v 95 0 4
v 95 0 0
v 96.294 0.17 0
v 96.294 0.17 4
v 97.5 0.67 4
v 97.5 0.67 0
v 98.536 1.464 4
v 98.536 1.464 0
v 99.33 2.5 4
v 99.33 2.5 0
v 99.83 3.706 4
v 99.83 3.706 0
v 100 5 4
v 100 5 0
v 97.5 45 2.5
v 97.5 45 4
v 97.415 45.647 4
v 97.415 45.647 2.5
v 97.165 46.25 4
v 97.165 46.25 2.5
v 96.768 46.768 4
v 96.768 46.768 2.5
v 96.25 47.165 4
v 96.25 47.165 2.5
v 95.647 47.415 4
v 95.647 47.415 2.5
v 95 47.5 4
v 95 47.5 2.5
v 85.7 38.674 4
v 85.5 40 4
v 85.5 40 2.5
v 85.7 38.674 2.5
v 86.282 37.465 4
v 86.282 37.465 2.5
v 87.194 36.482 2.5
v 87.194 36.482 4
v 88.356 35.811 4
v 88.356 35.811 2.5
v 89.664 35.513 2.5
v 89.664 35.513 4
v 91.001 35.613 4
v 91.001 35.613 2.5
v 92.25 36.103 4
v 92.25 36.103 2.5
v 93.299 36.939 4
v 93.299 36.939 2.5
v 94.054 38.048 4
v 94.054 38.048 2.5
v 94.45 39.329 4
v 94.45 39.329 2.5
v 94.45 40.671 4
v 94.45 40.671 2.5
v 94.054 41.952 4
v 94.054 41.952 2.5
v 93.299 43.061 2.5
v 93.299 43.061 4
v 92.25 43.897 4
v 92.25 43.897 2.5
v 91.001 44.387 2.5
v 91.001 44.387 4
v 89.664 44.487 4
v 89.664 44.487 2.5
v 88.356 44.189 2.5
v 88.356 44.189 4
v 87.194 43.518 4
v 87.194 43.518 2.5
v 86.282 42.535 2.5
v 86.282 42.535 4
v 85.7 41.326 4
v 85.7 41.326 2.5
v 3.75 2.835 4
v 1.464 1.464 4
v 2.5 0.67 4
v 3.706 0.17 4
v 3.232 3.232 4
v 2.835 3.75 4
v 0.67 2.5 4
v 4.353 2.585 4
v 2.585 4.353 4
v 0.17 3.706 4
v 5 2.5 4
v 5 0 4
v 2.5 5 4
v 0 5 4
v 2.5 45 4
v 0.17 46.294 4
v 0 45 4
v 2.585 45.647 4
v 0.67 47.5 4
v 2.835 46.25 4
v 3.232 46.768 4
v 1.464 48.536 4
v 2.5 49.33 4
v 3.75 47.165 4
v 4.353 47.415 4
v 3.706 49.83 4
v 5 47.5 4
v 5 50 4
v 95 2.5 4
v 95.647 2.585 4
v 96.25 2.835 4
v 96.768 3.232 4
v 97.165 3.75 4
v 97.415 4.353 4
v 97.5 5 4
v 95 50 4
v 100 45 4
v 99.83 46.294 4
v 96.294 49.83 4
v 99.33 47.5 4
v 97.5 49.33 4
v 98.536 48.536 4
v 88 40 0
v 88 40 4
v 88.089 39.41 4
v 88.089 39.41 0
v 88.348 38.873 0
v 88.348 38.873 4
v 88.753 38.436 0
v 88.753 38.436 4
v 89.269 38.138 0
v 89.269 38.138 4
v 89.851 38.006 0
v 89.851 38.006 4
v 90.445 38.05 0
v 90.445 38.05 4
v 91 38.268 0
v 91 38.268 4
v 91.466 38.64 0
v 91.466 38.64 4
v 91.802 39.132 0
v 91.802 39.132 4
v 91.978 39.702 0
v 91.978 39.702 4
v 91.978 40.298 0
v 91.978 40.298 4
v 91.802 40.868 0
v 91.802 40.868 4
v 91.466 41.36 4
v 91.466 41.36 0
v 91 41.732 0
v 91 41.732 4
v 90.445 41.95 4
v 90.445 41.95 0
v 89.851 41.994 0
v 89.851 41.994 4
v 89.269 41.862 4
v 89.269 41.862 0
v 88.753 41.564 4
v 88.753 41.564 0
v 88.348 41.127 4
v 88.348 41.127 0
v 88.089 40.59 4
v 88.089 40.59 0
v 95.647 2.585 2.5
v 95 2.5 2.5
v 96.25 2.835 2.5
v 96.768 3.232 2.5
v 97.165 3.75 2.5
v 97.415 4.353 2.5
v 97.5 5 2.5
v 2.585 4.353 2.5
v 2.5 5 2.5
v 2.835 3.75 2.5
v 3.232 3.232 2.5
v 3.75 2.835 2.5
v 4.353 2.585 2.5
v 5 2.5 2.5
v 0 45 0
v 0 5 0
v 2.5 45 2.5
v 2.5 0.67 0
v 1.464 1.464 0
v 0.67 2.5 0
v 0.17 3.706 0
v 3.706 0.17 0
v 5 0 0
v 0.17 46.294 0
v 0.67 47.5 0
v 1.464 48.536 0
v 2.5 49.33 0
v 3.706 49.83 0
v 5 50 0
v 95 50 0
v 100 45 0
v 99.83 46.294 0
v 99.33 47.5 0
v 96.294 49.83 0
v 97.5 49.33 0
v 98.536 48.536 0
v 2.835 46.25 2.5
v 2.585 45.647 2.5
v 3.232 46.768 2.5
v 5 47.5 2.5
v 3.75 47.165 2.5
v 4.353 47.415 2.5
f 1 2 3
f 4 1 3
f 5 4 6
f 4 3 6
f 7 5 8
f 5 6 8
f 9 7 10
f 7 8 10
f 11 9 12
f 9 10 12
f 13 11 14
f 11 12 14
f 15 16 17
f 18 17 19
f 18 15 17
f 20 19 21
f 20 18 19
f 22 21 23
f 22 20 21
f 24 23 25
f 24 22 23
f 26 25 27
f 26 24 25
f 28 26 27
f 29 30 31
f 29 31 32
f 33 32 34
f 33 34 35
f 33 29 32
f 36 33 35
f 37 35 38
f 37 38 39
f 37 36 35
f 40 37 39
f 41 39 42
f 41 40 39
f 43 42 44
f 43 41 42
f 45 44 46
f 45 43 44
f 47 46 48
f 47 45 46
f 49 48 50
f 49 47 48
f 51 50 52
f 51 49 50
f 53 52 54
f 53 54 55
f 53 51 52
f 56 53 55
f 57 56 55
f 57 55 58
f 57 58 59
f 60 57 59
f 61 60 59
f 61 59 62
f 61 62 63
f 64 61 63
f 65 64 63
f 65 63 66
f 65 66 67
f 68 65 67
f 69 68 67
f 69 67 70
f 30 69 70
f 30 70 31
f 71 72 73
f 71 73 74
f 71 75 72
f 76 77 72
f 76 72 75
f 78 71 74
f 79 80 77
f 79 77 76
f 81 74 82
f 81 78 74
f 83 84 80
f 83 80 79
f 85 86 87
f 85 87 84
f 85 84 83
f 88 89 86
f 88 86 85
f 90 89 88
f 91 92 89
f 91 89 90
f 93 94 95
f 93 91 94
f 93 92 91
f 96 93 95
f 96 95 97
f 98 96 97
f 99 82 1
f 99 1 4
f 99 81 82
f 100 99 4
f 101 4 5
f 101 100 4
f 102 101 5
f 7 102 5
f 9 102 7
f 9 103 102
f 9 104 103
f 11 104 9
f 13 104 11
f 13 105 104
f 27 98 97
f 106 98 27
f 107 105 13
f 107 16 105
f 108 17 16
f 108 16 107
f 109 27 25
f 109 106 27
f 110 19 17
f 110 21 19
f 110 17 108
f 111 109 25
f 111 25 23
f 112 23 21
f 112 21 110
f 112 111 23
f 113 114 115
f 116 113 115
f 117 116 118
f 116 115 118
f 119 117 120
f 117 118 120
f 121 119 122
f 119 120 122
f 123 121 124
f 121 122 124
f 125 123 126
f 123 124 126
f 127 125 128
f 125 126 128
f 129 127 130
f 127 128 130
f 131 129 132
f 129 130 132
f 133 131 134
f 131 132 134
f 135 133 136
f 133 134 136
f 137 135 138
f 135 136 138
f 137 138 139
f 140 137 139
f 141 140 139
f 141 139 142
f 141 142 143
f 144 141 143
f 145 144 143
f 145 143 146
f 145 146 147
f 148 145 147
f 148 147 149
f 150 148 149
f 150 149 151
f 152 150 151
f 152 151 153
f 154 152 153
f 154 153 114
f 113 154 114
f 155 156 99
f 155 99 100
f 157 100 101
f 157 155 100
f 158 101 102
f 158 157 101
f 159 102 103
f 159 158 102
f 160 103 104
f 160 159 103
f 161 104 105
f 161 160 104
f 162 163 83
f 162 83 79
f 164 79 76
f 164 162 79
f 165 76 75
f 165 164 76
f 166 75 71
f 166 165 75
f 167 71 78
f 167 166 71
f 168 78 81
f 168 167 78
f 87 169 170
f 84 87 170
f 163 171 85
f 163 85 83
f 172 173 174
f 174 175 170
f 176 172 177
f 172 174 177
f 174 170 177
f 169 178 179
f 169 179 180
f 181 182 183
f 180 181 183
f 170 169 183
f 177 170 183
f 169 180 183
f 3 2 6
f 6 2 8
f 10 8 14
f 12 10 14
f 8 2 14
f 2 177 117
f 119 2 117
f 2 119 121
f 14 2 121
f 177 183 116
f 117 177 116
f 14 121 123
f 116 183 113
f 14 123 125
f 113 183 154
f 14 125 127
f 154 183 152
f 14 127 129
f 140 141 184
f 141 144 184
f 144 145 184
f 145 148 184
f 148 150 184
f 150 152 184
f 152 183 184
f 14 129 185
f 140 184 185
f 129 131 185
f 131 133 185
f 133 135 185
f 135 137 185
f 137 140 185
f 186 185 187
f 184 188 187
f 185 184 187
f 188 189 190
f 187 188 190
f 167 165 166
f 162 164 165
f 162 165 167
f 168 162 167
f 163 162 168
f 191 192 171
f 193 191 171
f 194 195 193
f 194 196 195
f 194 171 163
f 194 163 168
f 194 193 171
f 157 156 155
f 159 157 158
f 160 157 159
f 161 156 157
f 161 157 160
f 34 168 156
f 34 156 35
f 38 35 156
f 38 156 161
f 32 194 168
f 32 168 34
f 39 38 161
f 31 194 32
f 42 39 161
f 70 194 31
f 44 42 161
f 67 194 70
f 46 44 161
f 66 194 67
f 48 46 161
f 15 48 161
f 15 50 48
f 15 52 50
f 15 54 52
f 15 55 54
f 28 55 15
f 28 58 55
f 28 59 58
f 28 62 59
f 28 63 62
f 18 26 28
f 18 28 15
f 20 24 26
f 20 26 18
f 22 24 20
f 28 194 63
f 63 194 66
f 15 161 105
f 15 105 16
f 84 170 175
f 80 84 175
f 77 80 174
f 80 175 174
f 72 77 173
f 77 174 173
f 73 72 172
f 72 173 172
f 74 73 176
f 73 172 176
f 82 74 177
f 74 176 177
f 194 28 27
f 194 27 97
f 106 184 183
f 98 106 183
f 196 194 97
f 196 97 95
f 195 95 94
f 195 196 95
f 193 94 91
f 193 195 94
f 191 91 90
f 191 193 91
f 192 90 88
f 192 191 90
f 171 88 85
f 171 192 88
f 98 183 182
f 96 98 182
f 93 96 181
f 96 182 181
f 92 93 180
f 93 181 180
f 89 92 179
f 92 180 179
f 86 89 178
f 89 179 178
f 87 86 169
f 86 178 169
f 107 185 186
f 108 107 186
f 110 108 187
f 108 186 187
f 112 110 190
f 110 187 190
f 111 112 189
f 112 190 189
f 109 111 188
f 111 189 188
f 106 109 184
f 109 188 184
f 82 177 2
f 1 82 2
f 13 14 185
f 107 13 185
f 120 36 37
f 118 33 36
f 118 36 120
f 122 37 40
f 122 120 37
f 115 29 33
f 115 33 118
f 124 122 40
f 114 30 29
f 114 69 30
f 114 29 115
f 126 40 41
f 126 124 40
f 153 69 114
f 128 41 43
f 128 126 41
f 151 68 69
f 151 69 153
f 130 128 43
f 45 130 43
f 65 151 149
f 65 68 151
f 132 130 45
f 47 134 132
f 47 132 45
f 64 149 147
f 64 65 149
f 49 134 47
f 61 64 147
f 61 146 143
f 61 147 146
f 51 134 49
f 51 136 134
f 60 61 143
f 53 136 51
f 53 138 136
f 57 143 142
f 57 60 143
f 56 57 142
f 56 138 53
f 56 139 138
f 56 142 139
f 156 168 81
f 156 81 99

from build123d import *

# Parameters (mm, degrees)
F1_DEPTH = 4
F2_D     = 4
F3_T     = -2.5


with BuildPart() as f1:
    # F0 (on Top) → F1 (new body)
    with BuildSketch(Plane.XY):
        with BuildLine():
            ThreePointArc((0, 5), (1.4644660941, 1.4644660941), (5, 0))
            Line((5, 0), (95, 0))
            ThreePointArc((95, 0), (98.5355339059, 1.4644660941), (100, 5))
            Line((100, 5), (100, 45))
            ThreePointArc((100, 45), (98.5355339059, 48.5355339059), (95, 50))
            Line((95, 50), (5, 50))
            ThreePointArc((5, 50), (1.4644660941, 48.5355339059), (0, 45))
            Line((0, 45), (0, 5))
        make_face()
        with BuildLine():
            ThreePointArc((5, 40), (6.4644660941, 43.5355339059), (10, 45))
            Line((10, 45), (90, 45))
            ThreePointArc((90, 45), (93.5355339059, 43.5355339059), (95, 40))
            Line((95, 40), (95, 10))
            ThreePointArc((95, 10), (93.5355339059, 6.4644660941), (90, 5))
            Line((90, 5), (10, 5))
            ThreePointArc((10, 5), (6.4644660941, 6.4644660941), (5, 10))
            Line((5, 10), (5, 40))
        make_face(mode=Mode.SUBTRACT)
        with BuildLine():
            Line((90, 45), (10, 45))
            ThreePointArc((10, 45), (6.4644660941, 43.5355339059), (5, 40))
            Line((5, 40), (5, 10))
            ThreePointArc((5, 10), (6.4644660941, 6.4644660941), (10, 5))
            Line((10, 5), (90, 5))
            ThreePointArc((90, 5), (93.5355339059, 6.4644660941), (95, 10))
            Line((95, 10), (95, 40))
            ThreePointArc((95, 40), (93.5355339059, 43.5355339059), (90, 45))
        make_face()
    extrude(amount=F1_DEPTH)

    # F2 (through all)
    with Locations(Plane(origin=(0, 0, 0), x_dir=(1, 0, 0), z_dir=(0, 0, -1))):
        with Locations((90, -40)):
            Hole(F2_D / 2)

    # F3
    f3_openings = [f1.faces().sort_by_distance(p)[0] for p in [
        (49.89878, 24.962043, 4),
    ]]
    offset(amount=F3_T, openings=f3_openings)


solid = f1.part
